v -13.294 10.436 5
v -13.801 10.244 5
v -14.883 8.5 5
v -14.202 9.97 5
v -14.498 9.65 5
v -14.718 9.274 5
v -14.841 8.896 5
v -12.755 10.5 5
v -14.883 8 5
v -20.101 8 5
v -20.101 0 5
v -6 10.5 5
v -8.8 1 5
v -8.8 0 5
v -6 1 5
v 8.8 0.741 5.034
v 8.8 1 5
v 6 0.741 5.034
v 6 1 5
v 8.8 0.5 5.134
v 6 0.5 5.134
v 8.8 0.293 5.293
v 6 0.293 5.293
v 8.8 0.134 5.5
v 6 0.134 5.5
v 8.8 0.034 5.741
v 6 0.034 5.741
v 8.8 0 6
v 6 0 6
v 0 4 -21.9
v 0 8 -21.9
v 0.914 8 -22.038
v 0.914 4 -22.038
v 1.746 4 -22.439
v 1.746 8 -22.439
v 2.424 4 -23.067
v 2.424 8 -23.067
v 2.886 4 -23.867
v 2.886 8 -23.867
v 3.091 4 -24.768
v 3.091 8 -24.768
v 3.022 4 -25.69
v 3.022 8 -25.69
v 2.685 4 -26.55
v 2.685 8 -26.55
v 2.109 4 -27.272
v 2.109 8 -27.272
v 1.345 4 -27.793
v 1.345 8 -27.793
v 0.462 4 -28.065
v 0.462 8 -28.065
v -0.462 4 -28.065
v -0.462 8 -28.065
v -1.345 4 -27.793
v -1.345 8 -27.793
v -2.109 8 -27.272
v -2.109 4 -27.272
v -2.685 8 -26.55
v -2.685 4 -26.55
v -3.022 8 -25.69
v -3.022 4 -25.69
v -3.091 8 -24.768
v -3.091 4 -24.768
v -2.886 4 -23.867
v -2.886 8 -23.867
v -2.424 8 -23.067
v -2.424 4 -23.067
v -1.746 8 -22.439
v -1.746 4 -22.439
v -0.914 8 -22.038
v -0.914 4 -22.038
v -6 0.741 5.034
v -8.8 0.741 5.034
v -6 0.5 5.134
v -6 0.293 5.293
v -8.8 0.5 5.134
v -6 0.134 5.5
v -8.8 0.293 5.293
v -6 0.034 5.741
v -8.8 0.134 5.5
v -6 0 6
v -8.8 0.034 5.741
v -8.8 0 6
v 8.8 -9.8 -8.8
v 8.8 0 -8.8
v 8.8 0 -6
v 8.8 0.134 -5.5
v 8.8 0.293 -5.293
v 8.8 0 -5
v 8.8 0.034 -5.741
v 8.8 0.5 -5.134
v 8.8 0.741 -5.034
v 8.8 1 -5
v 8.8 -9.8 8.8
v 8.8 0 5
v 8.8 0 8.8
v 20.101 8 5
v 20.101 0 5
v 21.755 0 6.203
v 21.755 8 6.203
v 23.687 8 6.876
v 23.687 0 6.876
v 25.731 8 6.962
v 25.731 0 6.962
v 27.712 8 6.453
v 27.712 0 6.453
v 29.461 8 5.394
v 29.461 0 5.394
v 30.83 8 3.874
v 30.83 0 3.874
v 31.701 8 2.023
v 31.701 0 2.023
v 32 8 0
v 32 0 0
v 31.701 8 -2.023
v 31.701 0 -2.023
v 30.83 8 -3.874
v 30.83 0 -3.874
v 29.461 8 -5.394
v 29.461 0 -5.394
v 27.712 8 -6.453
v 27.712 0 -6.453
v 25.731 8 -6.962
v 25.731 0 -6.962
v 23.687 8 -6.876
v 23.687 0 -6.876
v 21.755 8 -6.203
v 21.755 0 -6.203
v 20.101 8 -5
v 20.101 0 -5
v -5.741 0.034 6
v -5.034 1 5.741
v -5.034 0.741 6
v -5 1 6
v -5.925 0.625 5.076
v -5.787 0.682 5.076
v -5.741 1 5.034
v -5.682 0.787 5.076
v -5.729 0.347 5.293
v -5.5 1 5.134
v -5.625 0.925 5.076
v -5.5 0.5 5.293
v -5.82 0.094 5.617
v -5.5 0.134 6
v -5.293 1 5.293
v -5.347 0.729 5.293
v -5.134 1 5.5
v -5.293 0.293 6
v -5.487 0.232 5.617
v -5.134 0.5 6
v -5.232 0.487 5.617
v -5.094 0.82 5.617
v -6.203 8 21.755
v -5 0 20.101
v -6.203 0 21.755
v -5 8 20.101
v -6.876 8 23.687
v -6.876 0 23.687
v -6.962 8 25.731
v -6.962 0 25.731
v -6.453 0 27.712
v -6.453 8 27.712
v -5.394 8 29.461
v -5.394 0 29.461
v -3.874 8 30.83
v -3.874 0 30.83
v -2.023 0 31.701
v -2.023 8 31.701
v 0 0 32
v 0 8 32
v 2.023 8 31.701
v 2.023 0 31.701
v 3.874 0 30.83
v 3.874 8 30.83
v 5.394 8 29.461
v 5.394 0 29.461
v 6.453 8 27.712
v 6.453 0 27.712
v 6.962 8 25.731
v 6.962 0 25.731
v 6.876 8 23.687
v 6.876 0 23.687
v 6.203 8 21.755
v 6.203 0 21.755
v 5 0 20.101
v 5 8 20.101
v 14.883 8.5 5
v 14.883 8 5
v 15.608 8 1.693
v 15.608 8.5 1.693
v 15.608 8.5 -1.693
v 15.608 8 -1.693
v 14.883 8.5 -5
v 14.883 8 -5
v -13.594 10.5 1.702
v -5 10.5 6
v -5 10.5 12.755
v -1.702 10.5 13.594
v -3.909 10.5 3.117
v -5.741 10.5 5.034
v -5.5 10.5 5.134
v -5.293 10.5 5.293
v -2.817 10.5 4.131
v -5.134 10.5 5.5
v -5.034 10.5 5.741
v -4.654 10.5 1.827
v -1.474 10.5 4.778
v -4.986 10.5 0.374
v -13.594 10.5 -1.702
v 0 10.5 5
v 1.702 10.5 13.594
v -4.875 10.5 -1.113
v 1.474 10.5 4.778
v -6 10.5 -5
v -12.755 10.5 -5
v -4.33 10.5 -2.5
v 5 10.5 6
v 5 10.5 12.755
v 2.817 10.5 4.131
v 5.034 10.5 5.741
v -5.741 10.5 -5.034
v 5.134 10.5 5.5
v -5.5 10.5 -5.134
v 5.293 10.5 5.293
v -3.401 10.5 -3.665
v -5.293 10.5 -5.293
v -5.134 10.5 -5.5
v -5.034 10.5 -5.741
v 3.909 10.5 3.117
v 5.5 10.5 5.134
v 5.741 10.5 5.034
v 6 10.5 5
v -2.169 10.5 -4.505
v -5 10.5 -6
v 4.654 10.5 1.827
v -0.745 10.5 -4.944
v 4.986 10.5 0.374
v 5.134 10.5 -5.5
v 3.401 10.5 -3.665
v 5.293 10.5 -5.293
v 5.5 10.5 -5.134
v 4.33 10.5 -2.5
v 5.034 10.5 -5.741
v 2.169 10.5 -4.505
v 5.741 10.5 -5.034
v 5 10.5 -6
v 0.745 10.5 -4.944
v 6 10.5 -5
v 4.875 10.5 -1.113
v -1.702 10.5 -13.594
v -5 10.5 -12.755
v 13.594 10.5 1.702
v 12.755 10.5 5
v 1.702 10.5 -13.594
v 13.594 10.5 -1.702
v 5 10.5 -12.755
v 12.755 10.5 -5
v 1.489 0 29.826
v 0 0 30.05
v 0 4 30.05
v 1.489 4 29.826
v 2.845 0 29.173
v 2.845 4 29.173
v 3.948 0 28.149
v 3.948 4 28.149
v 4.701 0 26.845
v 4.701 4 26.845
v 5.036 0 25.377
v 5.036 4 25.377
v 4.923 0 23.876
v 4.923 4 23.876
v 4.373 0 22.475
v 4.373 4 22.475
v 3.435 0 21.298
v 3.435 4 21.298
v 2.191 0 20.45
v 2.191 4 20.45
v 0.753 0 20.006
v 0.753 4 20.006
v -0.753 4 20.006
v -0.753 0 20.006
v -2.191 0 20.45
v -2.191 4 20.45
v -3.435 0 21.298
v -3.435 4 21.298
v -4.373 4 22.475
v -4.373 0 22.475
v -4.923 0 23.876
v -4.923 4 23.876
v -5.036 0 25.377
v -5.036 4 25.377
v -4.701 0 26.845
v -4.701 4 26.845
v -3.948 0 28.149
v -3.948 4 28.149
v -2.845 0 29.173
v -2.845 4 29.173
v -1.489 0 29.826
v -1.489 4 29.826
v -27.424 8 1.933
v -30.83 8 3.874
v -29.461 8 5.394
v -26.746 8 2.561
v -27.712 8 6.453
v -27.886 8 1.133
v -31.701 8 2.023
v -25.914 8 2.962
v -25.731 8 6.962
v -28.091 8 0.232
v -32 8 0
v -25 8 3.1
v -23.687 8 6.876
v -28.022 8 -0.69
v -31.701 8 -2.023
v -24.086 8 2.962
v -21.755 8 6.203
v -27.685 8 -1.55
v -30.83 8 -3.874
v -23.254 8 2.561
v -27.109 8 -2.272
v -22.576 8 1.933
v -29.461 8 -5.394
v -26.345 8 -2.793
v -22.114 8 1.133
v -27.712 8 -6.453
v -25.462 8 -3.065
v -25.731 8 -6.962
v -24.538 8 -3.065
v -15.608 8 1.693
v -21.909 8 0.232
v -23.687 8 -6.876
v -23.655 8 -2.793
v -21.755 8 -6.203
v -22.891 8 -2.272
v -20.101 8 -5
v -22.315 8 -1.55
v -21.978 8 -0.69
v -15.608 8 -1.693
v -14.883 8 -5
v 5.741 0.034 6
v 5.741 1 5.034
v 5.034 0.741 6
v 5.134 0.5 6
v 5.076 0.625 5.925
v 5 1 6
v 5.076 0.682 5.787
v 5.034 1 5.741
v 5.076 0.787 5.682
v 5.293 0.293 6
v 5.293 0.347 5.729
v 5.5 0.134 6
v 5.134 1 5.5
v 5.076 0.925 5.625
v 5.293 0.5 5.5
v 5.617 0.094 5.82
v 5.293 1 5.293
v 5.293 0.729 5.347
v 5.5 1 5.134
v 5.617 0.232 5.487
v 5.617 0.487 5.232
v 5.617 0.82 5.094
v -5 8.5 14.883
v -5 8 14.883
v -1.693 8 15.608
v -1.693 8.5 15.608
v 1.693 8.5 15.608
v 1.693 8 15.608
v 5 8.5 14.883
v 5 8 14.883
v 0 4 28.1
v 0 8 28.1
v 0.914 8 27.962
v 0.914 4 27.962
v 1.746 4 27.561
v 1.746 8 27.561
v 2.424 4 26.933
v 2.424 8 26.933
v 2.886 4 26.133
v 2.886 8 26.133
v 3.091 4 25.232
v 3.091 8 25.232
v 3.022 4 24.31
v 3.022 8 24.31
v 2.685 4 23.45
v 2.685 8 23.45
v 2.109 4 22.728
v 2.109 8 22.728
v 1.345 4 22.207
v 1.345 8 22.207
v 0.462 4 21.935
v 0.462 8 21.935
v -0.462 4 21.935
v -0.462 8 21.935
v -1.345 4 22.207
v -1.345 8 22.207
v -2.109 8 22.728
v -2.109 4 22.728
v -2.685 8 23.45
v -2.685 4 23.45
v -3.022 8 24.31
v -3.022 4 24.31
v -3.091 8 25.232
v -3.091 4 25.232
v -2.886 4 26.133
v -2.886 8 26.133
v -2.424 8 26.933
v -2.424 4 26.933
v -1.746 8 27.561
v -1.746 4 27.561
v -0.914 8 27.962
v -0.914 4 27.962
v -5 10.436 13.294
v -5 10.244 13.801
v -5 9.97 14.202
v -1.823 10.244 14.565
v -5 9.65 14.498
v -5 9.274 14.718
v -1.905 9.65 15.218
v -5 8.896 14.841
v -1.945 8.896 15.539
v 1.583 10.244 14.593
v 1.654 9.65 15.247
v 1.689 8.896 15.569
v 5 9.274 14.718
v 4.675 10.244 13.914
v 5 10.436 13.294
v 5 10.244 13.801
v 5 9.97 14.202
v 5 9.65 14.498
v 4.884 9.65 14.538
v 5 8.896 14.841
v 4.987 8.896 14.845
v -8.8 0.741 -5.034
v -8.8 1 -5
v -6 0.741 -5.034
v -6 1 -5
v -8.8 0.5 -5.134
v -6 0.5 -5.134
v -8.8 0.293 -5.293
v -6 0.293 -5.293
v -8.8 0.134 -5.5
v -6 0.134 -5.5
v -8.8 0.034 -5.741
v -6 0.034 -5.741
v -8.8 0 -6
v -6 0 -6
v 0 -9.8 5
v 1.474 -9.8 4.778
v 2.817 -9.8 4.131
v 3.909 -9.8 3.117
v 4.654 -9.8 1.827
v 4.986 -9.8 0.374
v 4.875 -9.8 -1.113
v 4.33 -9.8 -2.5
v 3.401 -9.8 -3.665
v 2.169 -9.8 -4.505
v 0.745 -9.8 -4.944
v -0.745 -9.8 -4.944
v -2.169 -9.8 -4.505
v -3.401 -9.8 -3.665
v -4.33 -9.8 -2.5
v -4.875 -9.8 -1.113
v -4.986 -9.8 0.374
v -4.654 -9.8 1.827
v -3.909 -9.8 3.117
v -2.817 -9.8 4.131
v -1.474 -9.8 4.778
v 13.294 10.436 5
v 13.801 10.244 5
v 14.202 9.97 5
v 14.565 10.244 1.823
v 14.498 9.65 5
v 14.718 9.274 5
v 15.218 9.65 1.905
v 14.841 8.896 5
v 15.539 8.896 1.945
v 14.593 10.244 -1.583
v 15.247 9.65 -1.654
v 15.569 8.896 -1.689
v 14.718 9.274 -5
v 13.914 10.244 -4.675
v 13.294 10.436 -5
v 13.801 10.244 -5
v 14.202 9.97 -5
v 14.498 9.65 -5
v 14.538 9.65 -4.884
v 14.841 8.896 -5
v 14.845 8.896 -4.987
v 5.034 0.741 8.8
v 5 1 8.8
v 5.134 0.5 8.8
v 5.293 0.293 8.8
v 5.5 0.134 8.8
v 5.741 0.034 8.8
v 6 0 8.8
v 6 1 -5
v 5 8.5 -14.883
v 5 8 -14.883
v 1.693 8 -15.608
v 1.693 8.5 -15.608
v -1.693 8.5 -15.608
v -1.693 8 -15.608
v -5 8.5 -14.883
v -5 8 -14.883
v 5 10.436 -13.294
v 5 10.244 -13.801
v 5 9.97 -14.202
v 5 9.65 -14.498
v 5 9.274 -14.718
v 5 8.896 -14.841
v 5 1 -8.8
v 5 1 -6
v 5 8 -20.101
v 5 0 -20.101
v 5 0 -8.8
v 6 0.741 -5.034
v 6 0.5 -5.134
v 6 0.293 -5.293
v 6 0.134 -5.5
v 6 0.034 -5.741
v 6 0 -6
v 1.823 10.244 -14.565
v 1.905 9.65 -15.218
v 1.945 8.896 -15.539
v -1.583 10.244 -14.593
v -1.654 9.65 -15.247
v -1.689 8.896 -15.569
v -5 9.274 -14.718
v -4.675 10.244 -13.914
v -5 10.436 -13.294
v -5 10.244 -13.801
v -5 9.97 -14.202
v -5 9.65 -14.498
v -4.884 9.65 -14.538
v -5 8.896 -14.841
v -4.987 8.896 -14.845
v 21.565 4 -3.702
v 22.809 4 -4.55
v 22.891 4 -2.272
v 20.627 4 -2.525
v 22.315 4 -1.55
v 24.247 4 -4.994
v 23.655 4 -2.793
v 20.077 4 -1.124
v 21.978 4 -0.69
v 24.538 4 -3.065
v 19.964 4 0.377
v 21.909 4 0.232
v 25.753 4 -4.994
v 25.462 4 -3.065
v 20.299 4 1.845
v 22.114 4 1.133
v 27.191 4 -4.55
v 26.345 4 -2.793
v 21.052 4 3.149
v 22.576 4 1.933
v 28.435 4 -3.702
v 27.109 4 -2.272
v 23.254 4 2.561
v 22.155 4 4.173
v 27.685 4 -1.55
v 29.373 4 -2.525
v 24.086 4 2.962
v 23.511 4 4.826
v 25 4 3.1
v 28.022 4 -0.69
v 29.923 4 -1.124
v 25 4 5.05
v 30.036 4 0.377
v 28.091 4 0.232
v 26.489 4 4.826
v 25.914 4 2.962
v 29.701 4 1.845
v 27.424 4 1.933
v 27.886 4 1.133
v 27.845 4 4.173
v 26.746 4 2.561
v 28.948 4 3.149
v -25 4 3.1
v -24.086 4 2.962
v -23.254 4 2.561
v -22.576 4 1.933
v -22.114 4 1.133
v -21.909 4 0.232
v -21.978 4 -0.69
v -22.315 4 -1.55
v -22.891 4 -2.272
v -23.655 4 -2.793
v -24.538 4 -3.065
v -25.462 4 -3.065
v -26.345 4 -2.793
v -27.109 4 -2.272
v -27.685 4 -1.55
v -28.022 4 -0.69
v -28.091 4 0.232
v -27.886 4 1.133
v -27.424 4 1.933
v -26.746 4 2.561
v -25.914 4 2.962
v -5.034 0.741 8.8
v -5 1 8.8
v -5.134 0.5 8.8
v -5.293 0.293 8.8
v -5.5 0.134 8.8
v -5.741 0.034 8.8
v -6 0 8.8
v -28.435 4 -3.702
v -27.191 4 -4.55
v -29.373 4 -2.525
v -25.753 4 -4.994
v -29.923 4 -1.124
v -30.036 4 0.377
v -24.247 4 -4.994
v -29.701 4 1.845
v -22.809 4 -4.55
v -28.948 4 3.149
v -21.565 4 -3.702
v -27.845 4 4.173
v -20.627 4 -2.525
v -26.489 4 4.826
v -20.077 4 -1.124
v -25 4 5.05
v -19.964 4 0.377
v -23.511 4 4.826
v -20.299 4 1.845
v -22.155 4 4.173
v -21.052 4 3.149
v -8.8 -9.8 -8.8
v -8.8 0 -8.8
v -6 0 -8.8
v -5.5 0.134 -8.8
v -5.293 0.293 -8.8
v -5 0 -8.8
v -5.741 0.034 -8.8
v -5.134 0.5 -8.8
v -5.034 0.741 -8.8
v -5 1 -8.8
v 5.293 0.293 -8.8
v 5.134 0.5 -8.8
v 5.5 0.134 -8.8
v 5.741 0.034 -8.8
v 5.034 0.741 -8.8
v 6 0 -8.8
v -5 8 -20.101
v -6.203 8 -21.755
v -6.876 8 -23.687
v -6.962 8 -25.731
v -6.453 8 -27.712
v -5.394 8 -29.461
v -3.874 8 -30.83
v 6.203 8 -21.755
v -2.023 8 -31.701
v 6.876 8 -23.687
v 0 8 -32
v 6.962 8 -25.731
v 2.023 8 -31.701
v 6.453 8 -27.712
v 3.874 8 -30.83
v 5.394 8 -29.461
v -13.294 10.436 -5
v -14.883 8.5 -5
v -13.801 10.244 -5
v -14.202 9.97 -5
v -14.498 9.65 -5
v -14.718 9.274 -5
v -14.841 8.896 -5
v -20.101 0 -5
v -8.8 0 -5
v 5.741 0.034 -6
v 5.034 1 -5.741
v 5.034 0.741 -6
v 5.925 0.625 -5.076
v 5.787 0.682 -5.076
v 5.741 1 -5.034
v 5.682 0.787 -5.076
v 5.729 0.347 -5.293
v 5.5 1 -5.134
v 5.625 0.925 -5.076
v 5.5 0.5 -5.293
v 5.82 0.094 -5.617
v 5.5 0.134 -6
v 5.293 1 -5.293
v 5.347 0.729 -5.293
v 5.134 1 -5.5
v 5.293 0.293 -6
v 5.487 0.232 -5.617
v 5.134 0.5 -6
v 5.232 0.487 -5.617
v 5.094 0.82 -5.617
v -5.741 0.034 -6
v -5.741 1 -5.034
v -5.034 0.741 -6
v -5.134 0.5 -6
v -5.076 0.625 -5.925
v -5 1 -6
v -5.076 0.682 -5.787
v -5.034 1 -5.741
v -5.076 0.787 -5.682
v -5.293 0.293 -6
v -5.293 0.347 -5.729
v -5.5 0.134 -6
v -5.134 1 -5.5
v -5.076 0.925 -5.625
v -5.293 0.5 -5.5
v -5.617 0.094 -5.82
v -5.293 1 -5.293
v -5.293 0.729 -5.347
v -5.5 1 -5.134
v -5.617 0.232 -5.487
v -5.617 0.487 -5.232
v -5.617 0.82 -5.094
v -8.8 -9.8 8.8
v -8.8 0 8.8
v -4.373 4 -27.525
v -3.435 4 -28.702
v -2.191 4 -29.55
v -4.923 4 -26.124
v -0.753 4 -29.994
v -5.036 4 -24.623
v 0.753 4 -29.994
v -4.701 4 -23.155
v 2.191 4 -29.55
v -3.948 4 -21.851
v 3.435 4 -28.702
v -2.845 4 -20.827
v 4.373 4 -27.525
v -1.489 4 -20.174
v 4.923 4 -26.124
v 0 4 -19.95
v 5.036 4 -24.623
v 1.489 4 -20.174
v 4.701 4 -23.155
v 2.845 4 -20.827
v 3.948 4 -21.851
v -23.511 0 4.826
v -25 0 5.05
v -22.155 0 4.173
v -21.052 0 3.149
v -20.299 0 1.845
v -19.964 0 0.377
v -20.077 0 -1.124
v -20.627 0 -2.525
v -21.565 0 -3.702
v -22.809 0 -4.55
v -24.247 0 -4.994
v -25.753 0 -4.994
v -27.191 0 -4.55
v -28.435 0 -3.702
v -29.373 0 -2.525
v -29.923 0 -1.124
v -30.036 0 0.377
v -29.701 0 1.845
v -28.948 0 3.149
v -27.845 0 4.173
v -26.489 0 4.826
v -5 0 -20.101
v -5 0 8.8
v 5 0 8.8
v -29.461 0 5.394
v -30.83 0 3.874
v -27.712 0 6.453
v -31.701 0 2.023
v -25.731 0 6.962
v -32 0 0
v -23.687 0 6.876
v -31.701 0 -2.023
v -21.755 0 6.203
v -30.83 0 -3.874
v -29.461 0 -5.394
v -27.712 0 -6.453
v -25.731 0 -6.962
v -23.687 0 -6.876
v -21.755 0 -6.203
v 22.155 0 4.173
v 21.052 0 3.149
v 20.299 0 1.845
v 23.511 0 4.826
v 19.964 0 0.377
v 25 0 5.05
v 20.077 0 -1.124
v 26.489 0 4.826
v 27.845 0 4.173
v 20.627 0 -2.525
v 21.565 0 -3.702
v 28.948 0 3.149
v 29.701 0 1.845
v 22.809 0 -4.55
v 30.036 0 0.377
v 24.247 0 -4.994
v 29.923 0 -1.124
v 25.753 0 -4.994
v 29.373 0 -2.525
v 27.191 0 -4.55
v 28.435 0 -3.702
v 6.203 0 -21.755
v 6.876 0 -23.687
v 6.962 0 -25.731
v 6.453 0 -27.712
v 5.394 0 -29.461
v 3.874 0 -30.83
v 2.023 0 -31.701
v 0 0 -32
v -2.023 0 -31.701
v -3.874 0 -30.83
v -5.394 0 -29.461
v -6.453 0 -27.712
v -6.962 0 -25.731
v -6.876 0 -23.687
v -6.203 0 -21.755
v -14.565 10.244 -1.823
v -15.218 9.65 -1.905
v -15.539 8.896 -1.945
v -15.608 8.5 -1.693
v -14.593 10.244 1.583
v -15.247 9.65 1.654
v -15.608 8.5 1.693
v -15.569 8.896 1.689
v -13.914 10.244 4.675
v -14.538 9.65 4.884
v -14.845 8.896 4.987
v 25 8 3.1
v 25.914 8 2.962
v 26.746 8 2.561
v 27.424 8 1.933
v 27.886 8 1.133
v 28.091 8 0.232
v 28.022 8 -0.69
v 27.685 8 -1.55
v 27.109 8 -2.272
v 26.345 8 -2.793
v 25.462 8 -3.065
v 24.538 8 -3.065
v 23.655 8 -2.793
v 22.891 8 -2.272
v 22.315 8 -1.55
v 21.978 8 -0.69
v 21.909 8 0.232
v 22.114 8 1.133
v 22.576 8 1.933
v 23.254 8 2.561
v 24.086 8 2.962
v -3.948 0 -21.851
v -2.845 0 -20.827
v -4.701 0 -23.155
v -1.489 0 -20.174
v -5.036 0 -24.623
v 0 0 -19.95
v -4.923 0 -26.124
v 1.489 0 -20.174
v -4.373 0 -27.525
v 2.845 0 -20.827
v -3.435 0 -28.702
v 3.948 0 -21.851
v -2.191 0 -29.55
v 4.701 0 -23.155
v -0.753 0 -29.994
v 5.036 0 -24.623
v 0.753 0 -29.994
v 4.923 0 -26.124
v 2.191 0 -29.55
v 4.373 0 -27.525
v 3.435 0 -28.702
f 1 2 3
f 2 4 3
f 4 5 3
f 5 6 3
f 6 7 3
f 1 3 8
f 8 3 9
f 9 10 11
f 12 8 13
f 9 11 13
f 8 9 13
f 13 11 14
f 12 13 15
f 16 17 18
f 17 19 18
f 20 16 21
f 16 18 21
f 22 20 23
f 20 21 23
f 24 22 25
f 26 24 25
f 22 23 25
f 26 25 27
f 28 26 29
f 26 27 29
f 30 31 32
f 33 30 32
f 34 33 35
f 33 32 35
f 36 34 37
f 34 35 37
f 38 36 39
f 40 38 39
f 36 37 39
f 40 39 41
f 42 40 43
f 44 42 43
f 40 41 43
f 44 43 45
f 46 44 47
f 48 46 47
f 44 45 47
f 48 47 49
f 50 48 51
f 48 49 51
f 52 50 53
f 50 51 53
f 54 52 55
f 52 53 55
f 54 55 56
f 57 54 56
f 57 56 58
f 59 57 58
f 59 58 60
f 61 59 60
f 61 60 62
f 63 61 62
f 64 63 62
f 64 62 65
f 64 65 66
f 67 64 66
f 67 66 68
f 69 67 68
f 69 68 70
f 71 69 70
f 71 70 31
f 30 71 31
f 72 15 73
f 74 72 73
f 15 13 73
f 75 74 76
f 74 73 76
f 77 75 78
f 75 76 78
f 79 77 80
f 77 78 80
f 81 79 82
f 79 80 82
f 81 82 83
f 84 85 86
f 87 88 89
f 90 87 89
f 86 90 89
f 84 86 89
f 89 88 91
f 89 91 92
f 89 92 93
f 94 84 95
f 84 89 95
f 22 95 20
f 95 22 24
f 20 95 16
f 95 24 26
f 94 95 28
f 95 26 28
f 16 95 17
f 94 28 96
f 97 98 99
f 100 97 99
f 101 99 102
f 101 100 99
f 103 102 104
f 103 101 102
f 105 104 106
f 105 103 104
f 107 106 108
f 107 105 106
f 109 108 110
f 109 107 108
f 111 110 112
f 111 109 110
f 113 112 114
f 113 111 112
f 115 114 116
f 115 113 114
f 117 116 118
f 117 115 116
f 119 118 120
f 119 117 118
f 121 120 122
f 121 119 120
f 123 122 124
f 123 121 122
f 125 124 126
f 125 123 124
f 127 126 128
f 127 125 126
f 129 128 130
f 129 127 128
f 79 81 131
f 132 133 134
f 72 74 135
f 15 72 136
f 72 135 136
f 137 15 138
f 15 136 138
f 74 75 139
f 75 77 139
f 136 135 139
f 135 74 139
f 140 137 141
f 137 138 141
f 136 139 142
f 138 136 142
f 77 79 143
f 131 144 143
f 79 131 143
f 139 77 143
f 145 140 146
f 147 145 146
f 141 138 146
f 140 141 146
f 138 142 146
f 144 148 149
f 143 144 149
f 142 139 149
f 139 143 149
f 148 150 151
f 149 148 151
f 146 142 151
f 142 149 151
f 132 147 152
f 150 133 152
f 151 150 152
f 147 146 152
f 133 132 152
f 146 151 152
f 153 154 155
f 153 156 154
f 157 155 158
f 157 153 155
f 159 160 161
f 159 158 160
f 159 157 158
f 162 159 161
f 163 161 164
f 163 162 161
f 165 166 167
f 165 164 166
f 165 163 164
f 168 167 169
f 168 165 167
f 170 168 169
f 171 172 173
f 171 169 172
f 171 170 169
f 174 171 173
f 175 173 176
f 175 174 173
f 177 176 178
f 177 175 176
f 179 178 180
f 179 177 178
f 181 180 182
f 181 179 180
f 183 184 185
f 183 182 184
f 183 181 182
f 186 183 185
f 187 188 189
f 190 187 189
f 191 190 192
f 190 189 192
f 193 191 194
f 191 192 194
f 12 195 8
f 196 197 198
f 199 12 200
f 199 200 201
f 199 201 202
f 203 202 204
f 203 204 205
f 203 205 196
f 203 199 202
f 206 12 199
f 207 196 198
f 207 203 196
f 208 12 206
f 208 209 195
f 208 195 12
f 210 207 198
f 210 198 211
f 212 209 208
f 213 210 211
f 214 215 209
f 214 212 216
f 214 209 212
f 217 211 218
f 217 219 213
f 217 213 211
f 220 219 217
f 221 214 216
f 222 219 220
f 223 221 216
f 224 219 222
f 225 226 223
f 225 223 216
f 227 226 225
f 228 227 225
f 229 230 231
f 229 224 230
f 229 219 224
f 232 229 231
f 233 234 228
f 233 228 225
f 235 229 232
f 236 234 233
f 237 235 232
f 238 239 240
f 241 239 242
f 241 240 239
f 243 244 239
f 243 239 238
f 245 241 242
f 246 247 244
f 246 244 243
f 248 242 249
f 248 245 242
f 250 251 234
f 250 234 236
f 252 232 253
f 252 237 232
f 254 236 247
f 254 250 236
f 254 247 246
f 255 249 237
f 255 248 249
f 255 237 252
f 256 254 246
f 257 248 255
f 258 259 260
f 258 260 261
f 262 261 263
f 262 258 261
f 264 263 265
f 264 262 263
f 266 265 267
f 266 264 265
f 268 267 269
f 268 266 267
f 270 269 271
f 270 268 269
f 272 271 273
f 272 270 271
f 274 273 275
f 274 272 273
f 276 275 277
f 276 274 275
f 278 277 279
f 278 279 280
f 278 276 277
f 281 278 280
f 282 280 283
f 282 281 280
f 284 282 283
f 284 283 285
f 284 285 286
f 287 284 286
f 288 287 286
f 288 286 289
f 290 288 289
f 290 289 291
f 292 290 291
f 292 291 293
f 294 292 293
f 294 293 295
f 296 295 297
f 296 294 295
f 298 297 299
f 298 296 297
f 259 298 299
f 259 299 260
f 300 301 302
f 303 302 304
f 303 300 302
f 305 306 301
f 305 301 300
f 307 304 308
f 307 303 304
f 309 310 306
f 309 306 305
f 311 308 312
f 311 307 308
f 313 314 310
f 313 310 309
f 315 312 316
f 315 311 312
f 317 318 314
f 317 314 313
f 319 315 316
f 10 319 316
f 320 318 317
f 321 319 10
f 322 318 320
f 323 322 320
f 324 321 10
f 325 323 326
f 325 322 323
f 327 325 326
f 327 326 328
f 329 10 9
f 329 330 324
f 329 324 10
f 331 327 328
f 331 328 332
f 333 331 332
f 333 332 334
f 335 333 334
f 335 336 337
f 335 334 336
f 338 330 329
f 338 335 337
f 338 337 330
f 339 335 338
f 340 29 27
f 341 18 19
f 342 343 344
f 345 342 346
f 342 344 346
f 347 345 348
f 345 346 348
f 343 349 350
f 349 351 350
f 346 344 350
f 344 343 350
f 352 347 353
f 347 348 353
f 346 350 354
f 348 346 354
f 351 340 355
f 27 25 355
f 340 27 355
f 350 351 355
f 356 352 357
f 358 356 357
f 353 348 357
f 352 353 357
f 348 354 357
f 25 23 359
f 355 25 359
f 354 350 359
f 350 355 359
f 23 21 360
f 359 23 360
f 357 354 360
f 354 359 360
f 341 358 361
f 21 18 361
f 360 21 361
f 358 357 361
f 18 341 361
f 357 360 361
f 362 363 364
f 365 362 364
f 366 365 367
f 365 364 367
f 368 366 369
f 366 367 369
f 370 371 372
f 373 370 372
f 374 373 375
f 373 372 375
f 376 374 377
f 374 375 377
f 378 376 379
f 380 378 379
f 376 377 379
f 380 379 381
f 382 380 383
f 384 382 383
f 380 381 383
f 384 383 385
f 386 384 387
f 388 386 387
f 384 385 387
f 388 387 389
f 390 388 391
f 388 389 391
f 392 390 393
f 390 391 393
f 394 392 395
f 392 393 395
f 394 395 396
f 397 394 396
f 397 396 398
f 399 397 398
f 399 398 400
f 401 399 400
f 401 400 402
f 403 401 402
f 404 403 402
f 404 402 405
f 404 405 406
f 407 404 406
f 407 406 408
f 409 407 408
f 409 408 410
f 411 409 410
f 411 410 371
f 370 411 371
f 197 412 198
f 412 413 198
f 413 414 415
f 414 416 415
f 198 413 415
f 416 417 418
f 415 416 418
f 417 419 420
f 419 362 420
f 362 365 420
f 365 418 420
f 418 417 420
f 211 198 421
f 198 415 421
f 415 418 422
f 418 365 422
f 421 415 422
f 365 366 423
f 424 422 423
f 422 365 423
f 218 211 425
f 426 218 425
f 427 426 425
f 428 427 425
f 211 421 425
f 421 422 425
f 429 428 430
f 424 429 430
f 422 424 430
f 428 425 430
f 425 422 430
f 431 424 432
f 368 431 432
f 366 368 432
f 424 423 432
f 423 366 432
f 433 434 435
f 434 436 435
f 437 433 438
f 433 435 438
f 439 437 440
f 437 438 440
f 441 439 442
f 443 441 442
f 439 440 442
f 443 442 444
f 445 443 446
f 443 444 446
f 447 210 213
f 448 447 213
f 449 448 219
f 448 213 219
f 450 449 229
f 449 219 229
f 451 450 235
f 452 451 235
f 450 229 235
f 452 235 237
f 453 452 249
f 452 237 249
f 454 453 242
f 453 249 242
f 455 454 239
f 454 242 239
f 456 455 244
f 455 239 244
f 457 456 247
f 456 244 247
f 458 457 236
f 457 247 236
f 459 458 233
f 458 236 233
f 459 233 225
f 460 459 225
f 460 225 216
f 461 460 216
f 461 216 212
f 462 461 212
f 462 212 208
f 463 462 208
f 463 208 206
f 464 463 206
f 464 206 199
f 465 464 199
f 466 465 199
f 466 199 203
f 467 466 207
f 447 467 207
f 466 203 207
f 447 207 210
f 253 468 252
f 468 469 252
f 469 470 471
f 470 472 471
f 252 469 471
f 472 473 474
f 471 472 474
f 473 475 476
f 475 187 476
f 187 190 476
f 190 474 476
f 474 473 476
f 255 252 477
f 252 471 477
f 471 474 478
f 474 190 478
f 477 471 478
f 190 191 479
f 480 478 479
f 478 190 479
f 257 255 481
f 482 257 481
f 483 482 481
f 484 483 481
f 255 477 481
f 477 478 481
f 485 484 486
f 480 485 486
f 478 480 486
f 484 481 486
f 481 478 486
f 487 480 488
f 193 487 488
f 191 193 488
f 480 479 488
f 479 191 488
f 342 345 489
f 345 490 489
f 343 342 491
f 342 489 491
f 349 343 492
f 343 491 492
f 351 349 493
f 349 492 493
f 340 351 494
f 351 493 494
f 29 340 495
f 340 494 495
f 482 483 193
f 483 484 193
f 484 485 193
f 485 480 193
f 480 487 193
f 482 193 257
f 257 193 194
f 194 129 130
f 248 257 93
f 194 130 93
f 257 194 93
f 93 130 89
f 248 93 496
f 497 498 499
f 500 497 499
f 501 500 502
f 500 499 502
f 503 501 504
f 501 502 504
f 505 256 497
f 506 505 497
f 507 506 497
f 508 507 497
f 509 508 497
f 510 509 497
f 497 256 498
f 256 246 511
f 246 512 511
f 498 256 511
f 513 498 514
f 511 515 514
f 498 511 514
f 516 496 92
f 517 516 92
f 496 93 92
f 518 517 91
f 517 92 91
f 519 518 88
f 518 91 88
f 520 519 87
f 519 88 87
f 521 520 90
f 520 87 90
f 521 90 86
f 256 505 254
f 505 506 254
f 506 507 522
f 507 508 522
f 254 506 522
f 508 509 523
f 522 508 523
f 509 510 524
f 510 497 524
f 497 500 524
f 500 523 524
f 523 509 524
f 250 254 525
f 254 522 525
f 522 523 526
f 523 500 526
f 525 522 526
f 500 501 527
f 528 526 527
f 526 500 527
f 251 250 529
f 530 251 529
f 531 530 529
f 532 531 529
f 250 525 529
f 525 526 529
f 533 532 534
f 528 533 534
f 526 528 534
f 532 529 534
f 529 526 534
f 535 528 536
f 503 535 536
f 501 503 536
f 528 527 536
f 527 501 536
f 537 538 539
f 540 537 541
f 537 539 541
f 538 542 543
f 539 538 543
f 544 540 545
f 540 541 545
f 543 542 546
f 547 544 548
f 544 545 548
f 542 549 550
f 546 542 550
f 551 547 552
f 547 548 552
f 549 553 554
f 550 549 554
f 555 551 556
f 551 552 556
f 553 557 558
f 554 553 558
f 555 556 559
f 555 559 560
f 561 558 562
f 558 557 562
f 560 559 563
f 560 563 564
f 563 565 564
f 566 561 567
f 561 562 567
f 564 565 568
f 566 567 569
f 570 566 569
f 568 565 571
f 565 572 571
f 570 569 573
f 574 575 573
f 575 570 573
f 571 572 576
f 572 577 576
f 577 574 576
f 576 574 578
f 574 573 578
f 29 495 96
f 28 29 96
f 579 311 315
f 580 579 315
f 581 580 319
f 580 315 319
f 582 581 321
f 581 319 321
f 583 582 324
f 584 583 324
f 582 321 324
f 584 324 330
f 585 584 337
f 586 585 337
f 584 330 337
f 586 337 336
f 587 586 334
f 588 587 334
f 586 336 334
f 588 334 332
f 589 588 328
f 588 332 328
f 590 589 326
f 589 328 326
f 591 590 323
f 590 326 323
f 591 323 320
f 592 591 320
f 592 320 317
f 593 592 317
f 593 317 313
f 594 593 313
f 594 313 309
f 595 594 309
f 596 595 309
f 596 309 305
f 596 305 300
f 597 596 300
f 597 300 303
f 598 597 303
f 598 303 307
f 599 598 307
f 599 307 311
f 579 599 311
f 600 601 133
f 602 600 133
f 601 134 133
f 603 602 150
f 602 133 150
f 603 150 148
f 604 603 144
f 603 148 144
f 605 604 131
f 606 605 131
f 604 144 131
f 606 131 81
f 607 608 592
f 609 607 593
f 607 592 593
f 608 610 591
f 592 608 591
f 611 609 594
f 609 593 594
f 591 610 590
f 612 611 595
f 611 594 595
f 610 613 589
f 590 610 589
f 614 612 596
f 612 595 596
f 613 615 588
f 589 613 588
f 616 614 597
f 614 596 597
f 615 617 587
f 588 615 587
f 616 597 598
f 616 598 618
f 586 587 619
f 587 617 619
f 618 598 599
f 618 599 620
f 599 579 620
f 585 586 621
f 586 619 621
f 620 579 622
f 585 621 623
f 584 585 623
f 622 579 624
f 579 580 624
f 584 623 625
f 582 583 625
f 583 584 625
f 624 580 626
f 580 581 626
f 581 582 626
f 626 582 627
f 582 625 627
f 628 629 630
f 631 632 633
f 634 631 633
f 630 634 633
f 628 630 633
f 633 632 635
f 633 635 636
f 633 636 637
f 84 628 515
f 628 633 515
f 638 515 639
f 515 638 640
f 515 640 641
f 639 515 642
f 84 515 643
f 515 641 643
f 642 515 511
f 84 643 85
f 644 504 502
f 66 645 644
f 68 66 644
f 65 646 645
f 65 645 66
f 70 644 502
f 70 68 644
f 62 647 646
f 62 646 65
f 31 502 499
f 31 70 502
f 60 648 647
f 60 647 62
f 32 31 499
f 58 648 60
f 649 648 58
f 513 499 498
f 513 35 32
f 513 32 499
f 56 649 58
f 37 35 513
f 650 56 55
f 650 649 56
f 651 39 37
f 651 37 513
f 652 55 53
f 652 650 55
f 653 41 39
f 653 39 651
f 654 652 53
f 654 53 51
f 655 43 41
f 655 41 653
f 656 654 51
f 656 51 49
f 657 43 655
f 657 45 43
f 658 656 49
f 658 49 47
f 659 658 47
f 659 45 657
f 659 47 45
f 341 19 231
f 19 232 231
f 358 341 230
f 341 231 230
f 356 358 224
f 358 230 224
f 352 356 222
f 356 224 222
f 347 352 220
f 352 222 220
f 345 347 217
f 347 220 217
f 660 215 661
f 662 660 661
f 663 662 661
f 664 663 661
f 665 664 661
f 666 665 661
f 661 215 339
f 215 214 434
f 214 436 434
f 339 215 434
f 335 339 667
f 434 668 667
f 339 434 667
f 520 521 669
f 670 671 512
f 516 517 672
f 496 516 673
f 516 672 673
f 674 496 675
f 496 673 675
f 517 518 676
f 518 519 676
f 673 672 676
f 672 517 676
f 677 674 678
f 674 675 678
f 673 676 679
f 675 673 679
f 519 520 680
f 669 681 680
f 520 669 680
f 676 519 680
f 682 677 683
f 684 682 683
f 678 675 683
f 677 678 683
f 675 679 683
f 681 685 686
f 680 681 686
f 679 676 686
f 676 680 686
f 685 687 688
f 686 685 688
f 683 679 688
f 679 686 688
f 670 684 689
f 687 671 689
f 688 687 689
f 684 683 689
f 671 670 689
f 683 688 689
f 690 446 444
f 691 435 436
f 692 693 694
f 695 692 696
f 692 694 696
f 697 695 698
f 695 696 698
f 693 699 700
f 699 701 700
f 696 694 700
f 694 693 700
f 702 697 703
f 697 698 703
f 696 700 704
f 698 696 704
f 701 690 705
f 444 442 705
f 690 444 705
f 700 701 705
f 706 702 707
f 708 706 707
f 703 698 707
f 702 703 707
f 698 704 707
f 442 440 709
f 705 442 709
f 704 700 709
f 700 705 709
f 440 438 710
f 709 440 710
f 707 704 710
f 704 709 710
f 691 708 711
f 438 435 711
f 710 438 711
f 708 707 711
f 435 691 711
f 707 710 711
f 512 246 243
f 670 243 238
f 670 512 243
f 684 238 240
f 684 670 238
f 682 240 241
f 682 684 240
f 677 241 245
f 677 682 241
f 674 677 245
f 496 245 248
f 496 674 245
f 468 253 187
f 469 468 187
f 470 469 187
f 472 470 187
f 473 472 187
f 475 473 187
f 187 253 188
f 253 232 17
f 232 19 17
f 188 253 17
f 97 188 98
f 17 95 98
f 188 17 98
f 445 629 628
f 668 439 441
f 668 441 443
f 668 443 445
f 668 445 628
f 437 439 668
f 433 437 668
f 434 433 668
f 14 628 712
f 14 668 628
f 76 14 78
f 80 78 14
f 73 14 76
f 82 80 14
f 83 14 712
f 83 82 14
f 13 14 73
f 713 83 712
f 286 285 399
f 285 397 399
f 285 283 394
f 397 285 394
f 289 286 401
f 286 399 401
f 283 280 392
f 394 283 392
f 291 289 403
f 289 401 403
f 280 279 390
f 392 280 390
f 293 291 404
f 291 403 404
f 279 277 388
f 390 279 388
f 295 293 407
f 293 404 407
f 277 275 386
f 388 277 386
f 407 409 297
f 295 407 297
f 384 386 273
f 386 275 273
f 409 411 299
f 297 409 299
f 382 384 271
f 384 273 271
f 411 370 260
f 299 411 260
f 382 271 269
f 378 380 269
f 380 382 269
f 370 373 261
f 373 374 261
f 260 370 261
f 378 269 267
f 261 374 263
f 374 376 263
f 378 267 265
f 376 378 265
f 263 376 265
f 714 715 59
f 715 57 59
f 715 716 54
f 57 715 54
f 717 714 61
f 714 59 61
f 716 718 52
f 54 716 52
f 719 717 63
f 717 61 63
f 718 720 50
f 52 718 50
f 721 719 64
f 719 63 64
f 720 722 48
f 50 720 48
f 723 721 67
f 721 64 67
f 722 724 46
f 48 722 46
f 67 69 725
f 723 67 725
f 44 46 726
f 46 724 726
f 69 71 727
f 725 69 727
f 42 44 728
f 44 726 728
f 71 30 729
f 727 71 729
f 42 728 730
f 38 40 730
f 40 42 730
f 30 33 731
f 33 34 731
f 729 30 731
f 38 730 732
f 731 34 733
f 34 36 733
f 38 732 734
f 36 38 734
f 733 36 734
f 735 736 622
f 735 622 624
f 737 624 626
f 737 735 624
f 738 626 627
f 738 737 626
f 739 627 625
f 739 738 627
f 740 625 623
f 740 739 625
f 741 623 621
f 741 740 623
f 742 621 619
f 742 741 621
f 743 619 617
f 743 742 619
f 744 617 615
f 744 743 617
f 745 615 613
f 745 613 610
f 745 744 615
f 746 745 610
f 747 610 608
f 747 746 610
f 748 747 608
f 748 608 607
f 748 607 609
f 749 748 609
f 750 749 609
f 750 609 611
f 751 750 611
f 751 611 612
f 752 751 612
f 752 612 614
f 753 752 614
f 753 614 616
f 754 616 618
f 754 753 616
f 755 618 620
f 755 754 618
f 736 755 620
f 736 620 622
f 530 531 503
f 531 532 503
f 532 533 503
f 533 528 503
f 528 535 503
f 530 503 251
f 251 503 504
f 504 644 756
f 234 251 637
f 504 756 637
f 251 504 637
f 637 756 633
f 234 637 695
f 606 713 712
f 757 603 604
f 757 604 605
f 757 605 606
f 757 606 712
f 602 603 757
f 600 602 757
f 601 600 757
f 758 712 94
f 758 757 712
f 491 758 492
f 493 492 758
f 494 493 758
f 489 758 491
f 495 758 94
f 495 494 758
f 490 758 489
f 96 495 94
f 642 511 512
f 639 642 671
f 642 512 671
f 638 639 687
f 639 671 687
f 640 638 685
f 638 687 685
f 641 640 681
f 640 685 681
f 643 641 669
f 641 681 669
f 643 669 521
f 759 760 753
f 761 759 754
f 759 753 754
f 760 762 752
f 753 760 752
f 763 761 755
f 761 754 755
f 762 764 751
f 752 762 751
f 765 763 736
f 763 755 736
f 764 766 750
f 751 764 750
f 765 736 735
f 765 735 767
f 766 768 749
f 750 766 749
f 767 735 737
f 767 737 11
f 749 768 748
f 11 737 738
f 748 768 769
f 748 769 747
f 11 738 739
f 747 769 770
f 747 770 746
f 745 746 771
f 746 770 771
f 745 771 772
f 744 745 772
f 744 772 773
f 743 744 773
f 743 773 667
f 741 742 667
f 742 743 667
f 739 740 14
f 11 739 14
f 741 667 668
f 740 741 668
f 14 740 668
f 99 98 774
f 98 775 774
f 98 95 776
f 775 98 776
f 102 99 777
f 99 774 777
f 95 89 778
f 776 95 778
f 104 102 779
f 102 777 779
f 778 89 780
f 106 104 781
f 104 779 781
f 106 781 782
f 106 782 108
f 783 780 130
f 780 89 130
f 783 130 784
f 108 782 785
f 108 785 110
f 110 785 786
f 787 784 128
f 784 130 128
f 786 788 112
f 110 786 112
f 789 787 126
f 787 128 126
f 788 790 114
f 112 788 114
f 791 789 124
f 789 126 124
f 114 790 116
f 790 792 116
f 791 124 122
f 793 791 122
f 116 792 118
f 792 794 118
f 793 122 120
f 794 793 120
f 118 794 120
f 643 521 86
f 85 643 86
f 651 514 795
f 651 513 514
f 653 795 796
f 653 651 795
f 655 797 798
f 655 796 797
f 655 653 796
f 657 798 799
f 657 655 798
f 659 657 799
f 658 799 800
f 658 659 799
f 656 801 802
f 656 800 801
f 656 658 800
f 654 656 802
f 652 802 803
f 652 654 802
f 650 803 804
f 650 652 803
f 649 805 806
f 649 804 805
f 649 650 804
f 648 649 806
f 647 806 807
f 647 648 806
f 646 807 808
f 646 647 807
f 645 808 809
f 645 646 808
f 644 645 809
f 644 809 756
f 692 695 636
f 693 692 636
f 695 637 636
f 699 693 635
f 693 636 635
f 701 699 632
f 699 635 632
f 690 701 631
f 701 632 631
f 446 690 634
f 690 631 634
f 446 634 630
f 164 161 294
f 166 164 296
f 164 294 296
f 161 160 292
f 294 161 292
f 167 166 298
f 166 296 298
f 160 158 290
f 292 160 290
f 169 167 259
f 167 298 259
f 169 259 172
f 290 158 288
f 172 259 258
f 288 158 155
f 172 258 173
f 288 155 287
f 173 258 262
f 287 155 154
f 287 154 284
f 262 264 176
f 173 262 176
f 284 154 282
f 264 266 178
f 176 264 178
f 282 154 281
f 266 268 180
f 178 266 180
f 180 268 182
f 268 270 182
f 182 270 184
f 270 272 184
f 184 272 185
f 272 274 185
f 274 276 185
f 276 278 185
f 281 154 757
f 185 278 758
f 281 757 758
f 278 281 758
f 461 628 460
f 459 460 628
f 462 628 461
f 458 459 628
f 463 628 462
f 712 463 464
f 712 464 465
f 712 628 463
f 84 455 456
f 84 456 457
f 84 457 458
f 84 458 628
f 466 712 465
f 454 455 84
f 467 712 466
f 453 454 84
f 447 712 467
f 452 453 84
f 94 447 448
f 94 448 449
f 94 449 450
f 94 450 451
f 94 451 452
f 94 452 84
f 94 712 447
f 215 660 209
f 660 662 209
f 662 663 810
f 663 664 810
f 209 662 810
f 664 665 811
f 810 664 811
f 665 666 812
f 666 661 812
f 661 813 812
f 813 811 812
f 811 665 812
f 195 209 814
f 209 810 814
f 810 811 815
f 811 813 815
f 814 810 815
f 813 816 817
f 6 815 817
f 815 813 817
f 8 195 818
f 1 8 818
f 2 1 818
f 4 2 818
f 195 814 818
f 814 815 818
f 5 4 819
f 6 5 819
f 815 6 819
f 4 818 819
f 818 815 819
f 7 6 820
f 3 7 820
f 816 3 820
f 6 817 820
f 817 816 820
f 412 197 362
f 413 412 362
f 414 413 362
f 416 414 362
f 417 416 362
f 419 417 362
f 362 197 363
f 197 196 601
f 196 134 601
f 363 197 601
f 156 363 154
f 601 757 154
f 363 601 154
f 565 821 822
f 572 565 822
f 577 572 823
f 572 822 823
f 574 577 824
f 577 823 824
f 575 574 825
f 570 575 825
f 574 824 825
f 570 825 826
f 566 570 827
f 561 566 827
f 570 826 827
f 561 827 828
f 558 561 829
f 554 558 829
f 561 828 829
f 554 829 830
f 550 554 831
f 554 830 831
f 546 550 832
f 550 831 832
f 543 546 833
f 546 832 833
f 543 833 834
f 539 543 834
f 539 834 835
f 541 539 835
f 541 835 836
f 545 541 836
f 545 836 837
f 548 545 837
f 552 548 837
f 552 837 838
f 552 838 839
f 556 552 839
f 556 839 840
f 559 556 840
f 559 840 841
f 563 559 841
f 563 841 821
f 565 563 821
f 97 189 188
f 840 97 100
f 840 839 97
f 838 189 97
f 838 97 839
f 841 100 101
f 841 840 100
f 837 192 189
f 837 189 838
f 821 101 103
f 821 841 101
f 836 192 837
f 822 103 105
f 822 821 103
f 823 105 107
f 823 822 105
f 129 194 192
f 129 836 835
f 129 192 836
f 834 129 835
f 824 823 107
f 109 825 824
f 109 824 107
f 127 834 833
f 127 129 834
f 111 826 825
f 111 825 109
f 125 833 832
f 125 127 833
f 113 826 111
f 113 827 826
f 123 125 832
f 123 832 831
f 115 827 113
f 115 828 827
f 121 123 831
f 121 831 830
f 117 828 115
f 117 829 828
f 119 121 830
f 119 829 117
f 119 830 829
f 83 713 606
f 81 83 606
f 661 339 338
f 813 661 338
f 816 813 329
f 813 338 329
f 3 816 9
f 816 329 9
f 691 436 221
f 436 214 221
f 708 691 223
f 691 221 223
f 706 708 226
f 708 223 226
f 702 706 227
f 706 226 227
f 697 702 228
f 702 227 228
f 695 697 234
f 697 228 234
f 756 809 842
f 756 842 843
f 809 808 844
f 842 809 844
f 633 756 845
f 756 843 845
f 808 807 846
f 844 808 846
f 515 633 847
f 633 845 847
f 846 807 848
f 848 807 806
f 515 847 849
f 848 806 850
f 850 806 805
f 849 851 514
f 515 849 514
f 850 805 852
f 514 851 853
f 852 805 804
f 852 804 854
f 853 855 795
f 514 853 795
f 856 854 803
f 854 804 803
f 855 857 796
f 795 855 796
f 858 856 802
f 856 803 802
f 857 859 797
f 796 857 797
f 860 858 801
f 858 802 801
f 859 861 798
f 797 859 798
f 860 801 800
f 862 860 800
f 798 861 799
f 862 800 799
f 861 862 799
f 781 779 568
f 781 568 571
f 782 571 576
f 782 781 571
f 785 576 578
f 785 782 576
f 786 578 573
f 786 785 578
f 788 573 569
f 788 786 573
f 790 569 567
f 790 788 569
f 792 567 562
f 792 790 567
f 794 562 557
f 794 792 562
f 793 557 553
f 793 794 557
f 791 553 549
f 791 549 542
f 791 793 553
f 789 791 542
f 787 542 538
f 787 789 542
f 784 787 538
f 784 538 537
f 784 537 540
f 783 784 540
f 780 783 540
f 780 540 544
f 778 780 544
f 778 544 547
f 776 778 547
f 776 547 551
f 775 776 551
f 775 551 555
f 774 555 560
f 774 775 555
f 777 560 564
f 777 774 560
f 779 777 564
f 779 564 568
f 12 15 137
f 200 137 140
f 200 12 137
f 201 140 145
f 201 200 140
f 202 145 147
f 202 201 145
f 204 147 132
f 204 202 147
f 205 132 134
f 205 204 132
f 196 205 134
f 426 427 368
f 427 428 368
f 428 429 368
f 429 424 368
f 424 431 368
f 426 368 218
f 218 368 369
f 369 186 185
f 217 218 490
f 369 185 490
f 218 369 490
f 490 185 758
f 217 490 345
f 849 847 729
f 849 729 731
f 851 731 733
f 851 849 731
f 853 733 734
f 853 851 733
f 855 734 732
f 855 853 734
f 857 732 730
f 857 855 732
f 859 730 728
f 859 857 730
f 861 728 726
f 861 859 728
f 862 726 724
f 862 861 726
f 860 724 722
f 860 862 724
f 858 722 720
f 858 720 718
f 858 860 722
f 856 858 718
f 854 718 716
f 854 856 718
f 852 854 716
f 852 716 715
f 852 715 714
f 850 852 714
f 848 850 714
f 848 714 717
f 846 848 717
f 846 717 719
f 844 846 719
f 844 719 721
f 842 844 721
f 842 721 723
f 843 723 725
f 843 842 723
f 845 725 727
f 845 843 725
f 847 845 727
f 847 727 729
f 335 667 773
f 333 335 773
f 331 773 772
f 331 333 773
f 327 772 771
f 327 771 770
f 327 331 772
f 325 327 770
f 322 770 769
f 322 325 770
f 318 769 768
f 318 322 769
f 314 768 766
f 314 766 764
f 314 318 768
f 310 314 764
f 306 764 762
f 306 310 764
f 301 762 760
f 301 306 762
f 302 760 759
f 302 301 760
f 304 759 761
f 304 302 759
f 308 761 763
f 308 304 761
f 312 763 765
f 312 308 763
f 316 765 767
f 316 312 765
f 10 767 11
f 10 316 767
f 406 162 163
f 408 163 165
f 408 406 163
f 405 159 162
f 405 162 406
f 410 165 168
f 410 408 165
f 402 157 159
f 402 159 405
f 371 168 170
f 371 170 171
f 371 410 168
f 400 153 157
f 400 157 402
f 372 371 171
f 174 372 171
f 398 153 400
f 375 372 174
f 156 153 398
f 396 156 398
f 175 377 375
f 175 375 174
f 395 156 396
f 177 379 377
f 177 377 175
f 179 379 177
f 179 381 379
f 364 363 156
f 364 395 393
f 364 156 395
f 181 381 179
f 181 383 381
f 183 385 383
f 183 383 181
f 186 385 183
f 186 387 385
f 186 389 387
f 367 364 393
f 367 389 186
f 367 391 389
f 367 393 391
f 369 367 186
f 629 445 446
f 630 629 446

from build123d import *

# Parameters (mm, degrees)
BOSS_EXTRUDE1_DEPTH = 8
SKETCH2_R           = 7
BOSS_EXTRUDE2_DEPTH = 8
SKETCH3_R           = 3.1
CUT_EXTRUDE1_DEPTH  = 8
SKETCH4_R           = 5.05
CUT_EXTRUDE4_DEPTH  = 4
BOSS_EXTRUDE3_DEPTH = 2.5
SKETCH6_W           = 17.6
SKETCH6_H           = 17.6
BOSS_EXTRUDE4_DEPTH = 9.8
SKETCH7_R           = 5
CUT_EXTRUDE5_DEPTH  = 20.3
FILLET1_R           = 2
FILLET3_R           = 1


with BuildPart() as part:
    # Sketch1 → Boss-Extrude1 (new body)
    with BuildSketch(Plane(origin=(0, 0, 0), x_dir=(1, 0, 0), z_dir=(0, 1, 0))):
        Polygon((-5, 5), (-5, 25), (5, 25), (5, 5), (25, 5), (25, -5), (5, -5), (5, -25), (-5, -25), (-5, -5), (-25, -5), (-25, 5), align=None)
    extrude(amount=BOSS_EXTRUDE1_DEPTH)

    # Sketch2 → Boss-Extrude2 (add)
    with BuildSketch(Plane(origin=(0, 8, 0), x_dir=(1, 0, 0), z_dir=(0, 1, 0))):
        with Locations((25, 0)):
            Circle(SKETCH2_R)
        with Locations((0, -25)):
            Circle(SKETCH2_R)
        with Locations((-25, 0)):
            Circle(SKETCH2_R)
        with Locations((0, 25)):
            Circle(SKETCH2_R)
    extrude(amount=-BOSS_EXTRUDE2_DEPTH)

    # Sketch3 → Cut-Extrude1 (cut)
    with BuildSketch(Plane(origin=(0, 8, 0), x_dir=(1, 0, 0), z_dir=(0, 1, 0))):
        with Locations(Location((25, 0, 0), (0, 0, 270))):
            Circle(SKETCH3_R)
        with Locations(Location((0, -25, 0), (0, 0, 270))):
            Circle(SKETCH3_R)
        with Locations(Location((-25, 0, 0), (0, 0, 270))):
            Circle(SKETCH3_R)
        with Locations(Location((0, 25, 0), (0, 0, 270))):
            Circle(SKETCH3_R)
    extrude(amount=-CUT_EXTRUDE1_DEPTH, mode=Mode.SUBTRACT)

    # Sketch4 → Cut-Extrude4 (cut)
    with BuildSketch(Plane(origin=(0, 0, 0), x_dir=(1, 0, 0), z_dir=(0, 1, 0))):
        with Locations(Location((25, 0, 0), (0, 0, 270))):
            Circle(SKETCH4_R)
        with Locations(Location((0, -25, 0), (0, 0, 270))):
            Circle(SKETCH4_R)
        with Locations(Location((-25, 0, 0), (0, 0, 270))):
            Circle(SKETCH4_R)
        with Locations(Location((0, 25, 0), (0, 0, 270))):
            Circle(SKETCH4_R)
    extrude(amount=CUT_EXTRUDE4_DEPTH, mode=Mode.SUBTRACT)

    # Sketch5 → Boss-Extrude3 (add)
    with BuildSketch(Plane(origin=(0, 8, 0), x_dir=(1, 0, 0), z_dir=(0, 1, 0))):
        with BuildLine():
            Line((5, 5), (5, 14.882540106))
            ThreePointArc((5, 14.882540106), (0, 15.7), (-5, 14.882540106))
            Line((-5, 14.882540106), (-5, 5))
            Line((-5, 5), (-14.882540106, 5))
            ThreePointArc((-14.882540106, 5), (-15.7, 0), (-14.882540106, -5))
            Line((-14.882540106, -5), (-5, -5))
            Line((-5, -5), (-5, -14.882540106))
            ThreePointArc((-5, -14.882540106), (0, -15.7), (5, -14.882540106))
            Line((5, -14.882540106), (5, -5))
            Line((5, -5), (14.882540106, -5))
            ThreePointArc((14.882540106, -5), (15.7, 0), (14.882540106, 5))
            Line((14.882540106, 5), (5, 5))
        make_face()
    extrude(amount=BOSS_EXTRUDE3_DEPTH)

    # Sketch6 → Boss-Extrude4 (add)
    with BuildSketch(Plane.XZ):
        Rectangle(SKETCH6_W, SKETCH6_H)
    extrude(amount=BOSS_EXTRUDE4_DEPTH)

    # Sketch7 → Cut-Extrude5 (cut)
    with BuildSketch(Plane(origin=(0, 10.5, 0), x_dir=(1, 0, 0), z_dir=(0, 1, 0))):
        with Locations(Location((0, 0, 0), (0, 0, 270))):
            Circle(SKETCH7_R)
    extrude(amount=-CUT_EXTRUDE5_DEPTH, mode=Mode.SUBTRACT)

    # Fillet1
    fillet1_edges = [part.edges().sort_by_distance(p)[0] for p in [
        (0, 10.5, -15.7),
        (-15.7, 10.5, 0),
        (0, 10.5, 15.7),
        (15.7, 10.5, 0),
    ]]
    fillet(fillet1_edges, radius=FILLET1_R)

    # Fillet3
    fillet3_edges = [part.edges().sort_by_distance(p)[0] for p in [
        (6.9, 0, 5),
        (-5, 0, 6.9),
        (-6.9, 0, -5),
        (5, 0, -6.9),
        (-5, 0, -6.9),
        (6.9, 0, -5),
        (5, 0, 6.9),
        (-6.9, 0, 5),
        (5, 5.25, 5),
        (-5, 5.25, 5),
        (-5, 5.25, -5),
        (5, 5.25, -5),
    ]]
    fillet(fillet3_edges, radius=FILLET3_R)


solid = part.part
